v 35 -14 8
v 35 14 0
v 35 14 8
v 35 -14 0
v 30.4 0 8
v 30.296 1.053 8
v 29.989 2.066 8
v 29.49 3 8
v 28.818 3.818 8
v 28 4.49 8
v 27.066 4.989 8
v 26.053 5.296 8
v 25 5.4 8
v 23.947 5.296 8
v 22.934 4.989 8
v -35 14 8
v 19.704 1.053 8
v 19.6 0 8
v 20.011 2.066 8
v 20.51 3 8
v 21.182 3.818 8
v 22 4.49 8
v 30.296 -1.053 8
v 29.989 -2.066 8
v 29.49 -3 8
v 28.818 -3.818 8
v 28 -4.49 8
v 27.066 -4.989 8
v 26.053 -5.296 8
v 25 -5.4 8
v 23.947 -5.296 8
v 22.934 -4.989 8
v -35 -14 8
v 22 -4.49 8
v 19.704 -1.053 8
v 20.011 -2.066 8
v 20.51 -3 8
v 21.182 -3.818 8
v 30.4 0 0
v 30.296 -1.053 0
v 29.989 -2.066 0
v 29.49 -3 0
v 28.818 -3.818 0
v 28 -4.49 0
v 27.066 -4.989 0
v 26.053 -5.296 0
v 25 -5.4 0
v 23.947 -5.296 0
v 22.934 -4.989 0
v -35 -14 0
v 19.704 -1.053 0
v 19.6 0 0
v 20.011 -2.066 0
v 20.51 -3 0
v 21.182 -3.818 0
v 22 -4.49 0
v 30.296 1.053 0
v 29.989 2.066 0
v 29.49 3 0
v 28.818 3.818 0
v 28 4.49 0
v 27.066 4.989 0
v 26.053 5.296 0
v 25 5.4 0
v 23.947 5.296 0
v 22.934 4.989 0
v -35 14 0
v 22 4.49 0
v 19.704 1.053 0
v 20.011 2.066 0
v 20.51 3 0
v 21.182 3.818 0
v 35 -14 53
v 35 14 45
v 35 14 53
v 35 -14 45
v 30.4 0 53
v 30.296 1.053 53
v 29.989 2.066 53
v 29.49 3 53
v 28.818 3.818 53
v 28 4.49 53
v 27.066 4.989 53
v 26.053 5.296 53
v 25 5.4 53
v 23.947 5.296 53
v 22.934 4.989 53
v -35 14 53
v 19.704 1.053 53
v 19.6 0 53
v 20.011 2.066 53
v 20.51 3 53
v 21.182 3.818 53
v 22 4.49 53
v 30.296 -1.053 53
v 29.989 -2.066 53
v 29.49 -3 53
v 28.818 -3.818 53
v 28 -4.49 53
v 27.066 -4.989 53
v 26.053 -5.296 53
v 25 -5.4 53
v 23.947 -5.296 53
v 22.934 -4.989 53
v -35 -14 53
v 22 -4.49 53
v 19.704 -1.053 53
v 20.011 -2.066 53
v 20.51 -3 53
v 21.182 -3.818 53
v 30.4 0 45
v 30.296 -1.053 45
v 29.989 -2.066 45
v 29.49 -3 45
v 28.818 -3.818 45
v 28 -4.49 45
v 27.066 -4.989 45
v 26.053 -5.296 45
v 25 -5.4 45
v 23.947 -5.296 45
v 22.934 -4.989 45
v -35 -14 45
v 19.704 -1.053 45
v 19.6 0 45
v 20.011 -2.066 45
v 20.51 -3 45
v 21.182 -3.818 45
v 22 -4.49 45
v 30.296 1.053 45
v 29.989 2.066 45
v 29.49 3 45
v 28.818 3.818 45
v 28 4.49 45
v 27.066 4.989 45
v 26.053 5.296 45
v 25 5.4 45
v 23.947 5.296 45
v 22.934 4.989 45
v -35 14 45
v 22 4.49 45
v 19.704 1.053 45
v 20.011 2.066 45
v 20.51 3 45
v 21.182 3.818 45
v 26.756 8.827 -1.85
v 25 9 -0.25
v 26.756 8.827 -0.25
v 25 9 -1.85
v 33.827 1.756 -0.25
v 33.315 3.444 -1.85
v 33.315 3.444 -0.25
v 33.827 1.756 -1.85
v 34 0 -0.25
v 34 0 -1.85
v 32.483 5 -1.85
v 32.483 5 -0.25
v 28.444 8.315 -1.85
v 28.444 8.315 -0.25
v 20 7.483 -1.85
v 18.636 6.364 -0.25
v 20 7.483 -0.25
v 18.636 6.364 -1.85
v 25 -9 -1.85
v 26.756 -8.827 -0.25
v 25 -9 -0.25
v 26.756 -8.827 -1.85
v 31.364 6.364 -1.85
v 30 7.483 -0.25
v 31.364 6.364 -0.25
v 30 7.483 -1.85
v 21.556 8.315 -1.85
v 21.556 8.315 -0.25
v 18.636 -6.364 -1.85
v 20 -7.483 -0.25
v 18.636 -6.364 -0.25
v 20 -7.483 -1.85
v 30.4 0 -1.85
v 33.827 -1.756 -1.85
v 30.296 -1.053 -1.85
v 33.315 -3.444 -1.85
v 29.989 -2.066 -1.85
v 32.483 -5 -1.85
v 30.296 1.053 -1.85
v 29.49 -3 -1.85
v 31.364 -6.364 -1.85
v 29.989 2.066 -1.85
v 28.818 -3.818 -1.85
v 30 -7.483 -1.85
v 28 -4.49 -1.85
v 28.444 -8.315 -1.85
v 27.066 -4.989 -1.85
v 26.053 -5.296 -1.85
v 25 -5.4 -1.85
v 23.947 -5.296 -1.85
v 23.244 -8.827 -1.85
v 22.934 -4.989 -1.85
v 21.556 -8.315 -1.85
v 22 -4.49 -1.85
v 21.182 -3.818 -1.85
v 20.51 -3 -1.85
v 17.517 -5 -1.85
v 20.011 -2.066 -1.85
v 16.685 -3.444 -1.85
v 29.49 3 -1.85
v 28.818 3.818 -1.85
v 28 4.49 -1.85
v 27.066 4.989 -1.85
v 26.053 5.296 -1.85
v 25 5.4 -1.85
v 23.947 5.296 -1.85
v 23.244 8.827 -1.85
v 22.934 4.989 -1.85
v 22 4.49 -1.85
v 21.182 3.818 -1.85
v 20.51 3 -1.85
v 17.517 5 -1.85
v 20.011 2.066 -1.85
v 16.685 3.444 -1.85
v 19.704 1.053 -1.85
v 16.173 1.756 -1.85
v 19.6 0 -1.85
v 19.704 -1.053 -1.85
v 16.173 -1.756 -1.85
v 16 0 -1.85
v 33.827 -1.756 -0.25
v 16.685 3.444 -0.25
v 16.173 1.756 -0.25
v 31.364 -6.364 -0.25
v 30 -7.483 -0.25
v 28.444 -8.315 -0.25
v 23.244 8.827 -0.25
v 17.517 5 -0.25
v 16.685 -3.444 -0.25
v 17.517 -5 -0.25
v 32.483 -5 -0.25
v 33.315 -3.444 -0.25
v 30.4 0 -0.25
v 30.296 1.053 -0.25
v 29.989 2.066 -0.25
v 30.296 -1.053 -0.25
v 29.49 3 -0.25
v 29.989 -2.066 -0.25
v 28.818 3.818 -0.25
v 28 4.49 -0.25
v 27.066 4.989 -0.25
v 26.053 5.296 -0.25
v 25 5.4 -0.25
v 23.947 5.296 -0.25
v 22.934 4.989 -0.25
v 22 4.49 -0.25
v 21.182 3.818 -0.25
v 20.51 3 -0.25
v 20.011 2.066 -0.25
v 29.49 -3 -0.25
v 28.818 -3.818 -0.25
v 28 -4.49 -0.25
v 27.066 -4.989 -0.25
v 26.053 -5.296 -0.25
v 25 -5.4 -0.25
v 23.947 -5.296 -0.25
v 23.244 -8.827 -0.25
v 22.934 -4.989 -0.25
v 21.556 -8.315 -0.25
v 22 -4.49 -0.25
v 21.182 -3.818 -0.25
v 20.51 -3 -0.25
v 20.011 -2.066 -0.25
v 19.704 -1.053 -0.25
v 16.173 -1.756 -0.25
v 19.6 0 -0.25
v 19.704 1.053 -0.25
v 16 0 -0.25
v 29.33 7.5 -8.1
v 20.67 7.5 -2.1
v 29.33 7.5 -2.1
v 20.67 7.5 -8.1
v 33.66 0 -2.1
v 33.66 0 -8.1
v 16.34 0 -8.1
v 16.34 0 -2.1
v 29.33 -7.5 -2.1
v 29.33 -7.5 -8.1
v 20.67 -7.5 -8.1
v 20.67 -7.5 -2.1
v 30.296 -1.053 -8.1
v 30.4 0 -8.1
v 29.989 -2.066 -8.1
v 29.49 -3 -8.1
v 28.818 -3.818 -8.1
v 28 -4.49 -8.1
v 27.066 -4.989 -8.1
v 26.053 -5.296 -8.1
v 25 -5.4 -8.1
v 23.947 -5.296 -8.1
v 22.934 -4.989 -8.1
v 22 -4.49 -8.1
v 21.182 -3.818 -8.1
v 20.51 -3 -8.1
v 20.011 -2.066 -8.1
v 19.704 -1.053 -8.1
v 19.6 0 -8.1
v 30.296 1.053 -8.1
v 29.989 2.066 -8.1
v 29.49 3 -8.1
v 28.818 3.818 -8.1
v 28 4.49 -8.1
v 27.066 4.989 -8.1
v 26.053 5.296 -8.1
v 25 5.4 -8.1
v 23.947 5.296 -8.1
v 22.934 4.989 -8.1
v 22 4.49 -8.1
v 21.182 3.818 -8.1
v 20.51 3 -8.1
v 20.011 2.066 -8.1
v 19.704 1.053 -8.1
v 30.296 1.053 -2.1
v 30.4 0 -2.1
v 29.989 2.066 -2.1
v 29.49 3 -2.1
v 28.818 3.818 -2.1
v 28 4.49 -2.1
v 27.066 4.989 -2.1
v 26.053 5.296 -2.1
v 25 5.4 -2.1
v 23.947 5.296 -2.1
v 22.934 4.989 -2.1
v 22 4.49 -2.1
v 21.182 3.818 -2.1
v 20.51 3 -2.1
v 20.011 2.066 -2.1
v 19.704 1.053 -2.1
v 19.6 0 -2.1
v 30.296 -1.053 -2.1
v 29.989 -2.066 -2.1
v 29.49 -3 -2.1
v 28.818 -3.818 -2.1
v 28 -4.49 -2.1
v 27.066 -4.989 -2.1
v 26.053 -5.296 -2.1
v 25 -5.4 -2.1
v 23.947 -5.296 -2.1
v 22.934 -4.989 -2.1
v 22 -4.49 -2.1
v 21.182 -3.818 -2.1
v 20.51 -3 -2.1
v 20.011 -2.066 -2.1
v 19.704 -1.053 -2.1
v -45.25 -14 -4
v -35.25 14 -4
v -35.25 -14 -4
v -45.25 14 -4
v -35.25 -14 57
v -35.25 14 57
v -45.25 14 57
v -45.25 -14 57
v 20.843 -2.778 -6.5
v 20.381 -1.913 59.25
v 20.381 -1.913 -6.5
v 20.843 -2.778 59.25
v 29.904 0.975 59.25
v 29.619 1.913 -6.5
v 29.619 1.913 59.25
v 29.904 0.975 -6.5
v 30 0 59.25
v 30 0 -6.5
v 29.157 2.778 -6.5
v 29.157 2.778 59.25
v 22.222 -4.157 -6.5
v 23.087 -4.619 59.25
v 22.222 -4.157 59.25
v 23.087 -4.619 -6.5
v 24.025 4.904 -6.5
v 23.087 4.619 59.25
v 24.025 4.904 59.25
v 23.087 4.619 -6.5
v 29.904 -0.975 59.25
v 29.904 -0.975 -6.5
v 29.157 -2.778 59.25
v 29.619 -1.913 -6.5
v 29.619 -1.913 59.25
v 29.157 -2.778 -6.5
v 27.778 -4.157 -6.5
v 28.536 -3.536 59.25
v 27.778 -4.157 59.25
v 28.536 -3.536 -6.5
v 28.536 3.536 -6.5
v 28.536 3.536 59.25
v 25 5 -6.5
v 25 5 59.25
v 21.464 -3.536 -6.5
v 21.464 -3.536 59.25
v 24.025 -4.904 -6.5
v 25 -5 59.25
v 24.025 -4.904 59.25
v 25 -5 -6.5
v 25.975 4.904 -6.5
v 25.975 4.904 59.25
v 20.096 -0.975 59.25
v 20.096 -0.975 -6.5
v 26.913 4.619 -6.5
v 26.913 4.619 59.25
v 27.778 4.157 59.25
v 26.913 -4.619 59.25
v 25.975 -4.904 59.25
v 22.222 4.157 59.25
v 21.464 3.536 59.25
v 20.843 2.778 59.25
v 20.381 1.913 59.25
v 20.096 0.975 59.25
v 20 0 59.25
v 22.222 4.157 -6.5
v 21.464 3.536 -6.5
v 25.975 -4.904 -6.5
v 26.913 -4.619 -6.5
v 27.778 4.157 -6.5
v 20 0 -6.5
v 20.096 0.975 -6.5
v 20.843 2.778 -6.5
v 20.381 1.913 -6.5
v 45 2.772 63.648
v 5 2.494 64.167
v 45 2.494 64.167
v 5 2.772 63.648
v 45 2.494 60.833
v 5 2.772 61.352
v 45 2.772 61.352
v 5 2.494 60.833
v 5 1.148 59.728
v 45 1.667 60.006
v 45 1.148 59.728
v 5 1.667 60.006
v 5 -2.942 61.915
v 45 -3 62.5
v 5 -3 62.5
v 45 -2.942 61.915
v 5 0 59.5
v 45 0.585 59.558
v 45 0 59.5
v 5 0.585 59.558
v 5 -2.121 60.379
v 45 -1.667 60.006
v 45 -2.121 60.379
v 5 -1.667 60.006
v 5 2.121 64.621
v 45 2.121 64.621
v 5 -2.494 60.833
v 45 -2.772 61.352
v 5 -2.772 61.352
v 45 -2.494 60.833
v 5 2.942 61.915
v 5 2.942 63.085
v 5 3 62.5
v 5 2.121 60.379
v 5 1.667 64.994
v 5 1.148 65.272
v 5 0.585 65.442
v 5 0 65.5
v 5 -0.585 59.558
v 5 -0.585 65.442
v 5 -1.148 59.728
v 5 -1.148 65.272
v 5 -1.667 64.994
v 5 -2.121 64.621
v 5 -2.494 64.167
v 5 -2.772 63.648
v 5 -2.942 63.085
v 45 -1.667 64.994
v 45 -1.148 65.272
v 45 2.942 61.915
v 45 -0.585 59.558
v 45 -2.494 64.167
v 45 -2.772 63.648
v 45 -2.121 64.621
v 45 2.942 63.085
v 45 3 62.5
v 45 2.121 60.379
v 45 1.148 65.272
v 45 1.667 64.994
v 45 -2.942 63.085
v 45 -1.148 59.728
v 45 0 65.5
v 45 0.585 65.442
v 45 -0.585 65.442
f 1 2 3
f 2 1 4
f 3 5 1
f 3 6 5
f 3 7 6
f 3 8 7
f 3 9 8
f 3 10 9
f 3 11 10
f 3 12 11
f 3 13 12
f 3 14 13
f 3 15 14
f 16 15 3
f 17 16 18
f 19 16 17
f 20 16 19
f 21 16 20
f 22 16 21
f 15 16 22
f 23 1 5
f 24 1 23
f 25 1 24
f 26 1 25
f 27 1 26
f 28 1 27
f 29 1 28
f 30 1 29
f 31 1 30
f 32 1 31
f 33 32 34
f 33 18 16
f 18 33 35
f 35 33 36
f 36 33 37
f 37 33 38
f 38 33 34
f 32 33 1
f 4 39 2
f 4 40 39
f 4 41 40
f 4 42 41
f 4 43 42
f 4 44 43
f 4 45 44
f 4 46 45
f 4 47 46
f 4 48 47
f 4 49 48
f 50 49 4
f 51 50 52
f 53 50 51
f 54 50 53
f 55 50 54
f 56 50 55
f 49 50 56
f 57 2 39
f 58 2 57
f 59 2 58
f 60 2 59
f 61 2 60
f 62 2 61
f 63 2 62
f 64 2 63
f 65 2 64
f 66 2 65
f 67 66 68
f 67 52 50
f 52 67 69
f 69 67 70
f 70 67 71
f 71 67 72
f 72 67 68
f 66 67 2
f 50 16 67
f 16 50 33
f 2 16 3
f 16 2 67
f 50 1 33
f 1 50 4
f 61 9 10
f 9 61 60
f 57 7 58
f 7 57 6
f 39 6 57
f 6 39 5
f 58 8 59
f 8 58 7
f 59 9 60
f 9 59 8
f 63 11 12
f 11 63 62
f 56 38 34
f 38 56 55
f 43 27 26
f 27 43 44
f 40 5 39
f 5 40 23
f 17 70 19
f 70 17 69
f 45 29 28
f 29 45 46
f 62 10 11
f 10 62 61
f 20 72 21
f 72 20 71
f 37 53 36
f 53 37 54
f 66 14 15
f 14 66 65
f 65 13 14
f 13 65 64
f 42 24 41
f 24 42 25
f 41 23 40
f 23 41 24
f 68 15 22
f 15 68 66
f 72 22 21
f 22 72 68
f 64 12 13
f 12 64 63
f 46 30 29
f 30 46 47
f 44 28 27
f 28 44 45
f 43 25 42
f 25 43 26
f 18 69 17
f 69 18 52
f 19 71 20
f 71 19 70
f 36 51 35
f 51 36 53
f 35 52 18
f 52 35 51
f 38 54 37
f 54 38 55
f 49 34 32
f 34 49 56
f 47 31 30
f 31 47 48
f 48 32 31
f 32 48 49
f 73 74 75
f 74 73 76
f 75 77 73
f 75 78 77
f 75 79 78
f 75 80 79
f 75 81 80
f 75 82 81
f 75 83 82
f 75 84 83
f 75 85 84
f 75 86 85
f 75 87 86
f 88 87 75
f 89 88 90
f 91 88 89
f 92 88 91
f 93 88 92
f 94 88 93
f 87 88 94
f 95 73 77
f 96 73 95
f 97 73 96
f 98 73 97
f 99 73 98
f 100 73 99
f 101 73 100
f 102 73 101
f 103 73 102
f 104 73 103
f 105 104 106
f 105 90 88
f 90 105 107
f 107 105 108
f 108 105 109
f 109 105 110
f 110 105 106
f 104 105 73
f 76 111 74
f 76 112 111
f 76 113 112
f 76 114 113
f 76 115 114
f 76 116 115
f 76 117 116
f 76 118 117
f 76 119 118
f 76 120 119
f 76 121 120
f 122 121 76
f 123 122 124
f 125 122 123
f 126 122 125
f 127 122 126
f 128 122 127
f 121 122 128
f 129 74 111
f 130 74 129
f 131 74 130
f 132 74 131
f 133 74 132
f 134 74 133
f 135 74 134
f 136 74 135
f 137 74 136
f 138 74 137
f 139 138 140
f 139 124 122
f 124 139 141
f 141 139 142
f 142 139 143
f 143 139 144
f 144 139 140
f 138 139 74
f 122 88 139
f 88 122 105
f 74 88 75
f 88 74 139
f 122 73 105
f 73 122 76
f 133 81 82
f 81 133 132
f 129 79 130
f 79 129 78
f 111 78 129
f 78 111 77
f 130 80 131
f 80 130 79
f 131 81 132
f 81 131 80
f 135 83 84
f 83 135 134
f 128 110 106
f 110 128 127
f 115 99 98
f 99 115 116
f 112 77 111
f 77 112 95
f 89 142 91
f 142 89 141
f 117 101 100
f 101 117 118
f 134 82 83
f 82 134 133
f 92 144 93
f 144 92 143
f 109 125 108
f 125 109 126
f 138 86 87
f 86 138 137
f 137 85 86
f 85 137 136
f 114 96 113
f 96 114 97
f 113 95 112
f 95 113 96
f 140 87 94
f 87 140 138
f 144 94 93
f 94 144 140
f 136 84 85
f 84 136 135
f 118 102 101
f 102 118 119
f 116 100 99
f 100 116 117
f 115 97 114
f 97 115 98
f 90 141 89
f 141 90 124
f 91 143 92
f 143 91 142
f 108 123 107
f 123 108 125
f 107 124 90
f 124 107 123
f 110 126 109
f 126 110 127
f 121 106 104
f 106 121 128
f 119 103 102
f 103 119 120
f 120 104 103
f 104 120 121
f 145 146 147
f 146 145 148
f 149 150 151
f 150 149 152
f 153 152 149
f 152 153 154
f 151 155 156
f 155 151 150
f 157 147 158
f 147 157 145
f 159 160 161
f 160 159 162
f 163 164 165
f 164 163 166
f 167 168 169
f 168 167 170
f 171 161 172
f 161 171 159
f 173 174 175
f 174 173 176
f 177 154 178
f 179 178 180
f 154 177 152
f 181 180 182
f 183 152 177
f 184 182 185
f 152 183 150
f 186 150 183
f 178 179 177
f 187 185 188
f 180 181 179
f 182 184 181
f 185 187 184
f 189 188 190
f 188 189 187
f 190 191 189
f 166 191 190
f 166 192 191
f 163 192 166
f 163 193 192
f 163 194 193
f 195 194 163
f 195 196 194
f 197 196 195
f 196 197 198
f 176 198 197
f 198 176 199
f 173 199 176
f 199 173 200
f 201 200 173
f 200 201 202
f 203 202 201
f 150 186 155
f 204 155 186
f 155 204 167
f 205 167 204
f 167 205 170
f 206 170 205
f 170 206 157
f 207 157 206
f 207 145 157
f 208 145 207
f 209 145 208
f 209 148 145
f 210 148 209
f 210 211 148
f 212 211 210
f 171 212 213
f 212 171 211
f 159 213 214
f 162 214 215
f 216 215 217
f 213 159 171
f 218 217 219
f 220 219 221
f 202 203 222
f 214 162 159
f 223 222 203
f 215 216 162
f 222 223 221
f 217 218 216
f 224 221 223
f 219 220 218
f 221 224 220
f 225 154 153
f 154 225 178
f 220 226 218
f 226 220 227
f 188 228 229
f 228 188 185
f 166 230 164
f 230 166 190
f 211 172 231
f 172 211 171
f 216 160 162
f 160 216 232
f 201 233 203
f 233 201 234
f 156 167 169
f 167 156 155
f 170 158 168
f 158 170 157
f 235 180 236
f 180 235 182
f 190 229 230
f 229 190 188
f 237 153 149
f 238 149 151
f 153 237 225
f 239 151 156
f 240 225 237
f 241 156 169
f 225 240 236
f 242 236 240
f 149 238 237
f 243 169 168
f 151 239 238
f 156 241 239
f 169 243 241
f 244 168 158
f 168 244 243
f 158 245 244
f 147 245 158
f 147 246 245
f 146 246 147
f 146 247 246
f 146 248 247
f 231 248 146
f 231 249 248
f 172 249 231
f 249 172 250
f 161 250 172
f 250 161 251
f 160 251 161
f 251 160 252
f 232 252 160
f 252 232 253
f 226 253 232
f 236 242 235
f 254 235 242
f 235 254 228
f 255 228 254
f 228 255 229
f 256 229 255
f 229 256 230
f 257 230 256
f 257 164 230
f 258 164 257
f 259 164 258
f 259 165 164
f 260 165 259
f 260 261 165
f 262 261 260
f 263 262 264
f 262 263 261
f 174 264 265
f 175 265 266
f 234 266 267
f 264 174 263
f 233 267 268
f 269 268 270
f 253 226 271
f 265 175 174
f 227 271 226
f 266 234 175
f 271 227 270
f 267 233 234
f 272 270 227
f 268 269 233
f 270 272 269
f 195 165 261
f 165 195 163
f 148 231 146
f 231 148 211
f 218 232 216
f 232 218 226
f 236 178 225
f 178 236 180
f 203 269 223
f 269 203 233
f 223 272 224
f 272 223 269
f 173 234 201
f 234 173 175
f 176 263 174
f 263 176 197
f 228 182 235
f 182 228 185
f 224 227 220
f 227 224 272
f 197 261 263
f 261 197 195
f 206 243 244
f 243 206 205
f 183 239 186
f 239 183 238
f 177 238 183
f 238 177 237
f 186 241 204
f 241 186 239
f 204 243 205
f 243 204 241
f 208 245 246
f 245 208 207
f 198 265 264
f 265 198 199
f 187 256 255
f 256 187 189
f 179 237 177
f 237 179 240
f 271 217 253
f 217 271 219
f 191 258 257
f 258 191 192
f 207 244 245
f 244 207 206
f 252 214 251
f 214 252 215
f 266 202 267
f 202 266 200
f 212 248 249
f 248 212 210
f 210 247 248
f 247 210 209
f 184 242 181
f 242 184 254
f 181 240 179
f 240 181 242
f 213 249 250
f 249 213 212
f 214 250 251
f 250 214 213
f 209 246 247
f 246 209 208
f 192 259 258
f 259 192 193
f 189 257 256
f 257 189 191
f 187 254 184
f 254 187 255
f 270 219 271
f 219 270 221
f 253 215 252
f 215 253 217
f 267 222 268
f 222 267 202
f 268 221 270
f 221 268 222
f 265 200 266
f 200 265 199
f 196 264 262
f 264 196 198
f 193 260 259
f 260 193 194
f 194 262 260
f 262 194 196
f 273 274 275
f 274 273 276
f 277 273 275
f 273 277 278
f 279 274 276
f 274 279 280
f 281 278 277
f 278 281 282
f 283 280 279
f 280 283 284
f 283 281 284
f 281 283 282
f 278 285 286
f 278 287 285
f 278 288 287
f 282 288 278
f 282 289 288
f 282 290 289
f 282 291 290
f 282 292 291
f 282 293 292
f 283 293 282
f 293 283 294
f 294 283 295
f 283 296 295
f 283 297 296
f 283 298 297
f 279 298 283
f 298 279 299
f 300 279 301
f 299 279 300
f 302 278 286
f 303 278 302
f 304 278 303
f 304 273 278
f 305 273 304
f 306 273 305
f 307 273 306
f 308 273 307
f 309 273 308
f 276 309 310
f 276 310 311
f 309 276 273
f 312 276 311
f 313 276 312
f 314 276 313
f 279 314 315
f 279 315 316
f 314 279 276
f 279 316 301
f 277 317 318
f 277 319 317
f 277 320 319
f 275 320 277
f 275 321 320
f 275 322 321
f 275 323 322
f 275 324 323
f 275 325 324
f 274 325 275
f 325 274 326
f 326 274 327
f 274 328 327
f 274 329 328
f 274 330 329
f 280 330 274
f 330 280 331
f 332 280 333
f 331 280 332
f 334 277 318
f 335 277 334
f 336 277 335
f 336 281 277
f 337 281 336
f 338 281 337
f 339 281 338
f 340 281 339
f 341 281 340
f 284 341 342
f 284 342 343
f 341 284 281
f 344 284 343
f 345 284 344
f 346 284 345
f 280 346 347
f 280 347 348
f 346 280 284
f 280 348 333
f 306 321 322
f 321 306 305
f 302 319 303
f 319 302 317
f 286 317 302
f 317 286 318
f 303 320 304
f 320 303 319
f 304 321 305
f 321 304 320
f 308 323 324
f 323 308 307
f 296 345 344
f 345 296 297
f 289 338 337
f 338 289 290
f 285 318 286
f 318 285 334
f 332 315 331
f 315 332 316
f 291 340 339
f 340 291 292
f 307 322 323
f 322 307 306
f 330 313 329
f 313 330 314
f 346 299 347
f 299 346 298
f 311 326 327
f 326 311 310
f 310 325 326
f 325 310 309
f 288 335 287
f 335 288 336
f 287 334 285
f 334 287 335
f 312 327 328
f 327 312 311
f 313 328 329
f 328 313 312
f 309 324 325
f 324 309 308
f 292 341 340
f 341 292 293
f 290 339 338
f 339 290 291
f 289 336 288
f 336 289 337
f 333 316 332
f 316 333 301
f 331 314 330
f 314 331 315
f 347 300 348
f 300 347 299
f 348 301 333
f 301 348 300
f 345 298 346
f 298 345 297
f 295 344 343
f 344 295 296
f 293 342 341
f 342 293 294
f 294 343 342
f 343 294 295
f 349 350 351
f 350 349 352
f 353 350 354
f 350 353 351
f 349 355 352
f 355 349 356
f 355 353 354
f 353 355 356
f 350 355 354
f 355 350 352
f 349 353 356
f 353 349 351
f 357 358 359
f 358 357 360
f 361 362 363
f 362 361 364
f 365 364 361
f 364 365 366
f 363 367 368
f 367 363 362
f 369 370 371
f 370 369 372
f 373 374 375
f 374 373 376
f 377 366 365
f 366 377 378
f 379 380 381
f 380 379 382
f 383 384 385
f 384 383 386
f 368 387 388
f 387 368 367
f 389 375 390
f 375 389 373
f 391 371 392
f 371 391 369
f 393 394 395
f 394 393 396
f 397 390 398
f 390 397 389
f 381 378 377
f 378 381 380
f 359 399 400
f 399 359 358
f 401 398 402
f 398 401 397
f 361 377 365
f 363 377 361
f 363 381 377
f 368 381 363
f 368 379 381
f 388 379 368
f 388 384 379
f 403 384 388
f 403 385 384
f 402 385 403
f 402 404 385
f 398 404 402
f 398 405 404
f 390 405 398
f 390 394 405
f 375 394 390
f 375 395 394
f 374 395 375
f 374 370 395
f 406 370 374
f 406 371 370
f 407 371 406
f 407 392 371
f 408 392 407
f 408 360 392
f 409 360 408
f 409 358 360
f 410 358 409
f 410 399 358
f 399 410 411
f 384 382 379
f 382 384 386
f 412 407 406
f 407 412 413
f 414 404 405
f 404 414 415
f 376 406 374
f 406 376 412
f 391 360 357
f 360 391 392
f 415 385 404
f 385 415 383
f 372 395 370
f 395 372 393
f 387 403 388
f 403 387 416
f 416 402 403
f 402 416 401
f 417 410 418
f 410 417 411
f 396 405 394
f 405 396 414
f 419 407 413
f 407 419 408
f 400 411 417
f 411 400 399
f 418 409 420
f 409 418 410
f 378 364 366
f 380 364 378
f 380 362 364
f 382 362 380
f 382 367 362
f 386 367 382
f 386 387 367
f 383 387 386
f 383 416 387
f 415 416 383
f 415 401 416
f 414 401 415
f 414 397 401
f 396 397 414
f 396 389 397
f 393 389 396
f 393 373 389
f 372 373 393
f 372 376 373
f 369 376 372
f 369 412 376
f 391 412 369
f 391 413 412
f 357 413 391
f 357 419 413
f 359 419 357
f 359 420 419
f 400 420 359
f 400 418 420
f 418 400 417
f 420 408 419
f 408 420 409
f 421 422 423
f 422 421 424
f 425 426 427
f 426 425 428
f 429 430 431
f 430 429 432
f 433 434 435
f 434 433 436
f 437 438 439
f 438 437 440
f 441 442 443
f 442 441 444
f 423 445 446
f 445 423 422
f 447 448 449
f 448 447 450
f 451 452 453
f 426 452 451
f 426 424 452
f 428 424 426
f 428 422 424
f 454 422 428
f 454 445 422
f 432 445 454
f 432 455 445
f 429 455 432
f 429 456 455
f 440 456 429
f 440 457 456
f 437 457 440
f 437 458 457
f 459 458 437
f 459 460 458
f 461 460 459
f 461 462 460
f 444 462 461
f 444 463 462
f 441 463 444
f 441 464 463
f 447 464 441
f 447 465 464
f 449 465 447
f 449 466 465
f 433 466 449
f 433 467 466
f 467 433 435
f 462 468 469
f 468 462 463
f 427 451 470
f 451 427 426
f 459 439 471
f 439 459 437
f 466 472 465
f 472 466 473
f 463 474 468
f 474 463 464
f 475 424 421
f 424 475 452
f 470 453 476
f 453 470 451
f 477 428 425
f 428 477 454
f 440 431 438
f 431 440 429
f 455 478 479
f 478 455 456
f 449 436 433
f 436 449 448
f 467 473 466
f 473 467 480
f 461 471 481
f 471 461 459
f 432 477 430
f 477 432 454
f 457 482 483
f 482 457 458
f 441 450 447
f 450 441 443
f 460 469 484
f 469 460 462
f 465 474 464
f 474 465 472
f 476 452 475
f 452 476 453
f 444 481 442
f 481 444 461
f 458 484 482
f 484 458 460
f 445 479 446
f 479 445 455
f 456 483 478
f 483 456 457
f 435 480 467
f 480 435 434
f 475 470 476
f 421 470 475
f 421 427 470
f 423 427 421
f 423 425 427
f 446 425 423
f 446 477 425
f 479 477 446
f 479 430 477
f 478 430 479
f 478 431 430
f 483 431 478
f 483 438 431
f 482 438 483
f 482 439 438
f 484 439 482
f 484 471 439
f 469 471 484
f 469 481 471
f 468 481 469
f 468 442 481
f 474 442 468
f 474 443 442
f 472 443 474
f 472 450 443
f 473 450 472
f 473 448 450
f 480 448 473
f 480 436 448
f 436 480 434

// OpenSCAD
$fn = 32;

// ------------------------------------------------------------------------
// C clamp: throat 45 mm, screw d10
// Every part is its own module, assembly() places every instance.
// ------------------------------------------------------------------------

// --- part 1 ---
module clamp_arm() {
  difference() {
    translate([-35, -14, 0]) cube([70, 28, 8]);
    translate([25, 0, -1]) cylinder(h = 10, d = 10.8);
  }
}

// --- part 2 ---
module clamp_spine() {
  difference() {
    translate([-30.5, -14, 0]) cube([61, 28, 10]);
  }
}

// --- part 3 ---
module clamp_screw() {
  translate([0, 0, -32.875]) cylinder(h = 65.75, d = 10);
}

// --- part 4 ---
module clamp_washer() {
  difference() {
      translate([0, 0, 0]) cylinder(h = 1.6, d = 18);
      translate([0, 0, -1]) cylinder(h = 3.6, d = 10.8);
    }
}

// --- part 5 ---
module clamp_nut() {
  difference() {
    linear_extrude(height = 6) polygon(points = [[8.66, 0], [4.33, 7.5], [-4.33, 7.5], [-8.66, 0], [-4.33, -7.5], [4.33, -7.5]]);
    translate([0, 0, -1]) cylinder(h = 8, d = 10.8);
  }
}

// --- part 6 ---
module tommy_bar() {
  translate([0, 0, -20]) cylinder(h = 40, d = 6);
}

// --- assembly ---
module assembly() {
  color([0.80, 0.24, 0.20]) translate([0, 0, 0]) rotate([0, 0, 0]) clamp_arm();
  color([0.20, 0.45, 0.75]) translate([0, 0, 45]) rotate([0, 0, 0]) clamp_arm();
  color([0.25, 0.62, 0.32]) translate([-45.25, 0, 26.5]) rotate([0, 90, 0]) clamp_spine();
  color([0.92, 0.70, 0.18]) translate([25, 0, 26.375]) rotate([0, 0, 0]) clamp_screw();
  color([0.58, 0.35, 0.70]) translate([25, 0, -1.85]) rotate([0, 0, 0]) clamp_washer();
  color([0.16, 0.66, 0.66]) translate([25, 0, -8.1]) rotate([0, 0, 0]) clamp_nut();
  color([0.85, 0.48, 0.18]) translate([25, 0, 62.5]) rotate([0, 90, 0]) tommy_bar();
}

assembly();
